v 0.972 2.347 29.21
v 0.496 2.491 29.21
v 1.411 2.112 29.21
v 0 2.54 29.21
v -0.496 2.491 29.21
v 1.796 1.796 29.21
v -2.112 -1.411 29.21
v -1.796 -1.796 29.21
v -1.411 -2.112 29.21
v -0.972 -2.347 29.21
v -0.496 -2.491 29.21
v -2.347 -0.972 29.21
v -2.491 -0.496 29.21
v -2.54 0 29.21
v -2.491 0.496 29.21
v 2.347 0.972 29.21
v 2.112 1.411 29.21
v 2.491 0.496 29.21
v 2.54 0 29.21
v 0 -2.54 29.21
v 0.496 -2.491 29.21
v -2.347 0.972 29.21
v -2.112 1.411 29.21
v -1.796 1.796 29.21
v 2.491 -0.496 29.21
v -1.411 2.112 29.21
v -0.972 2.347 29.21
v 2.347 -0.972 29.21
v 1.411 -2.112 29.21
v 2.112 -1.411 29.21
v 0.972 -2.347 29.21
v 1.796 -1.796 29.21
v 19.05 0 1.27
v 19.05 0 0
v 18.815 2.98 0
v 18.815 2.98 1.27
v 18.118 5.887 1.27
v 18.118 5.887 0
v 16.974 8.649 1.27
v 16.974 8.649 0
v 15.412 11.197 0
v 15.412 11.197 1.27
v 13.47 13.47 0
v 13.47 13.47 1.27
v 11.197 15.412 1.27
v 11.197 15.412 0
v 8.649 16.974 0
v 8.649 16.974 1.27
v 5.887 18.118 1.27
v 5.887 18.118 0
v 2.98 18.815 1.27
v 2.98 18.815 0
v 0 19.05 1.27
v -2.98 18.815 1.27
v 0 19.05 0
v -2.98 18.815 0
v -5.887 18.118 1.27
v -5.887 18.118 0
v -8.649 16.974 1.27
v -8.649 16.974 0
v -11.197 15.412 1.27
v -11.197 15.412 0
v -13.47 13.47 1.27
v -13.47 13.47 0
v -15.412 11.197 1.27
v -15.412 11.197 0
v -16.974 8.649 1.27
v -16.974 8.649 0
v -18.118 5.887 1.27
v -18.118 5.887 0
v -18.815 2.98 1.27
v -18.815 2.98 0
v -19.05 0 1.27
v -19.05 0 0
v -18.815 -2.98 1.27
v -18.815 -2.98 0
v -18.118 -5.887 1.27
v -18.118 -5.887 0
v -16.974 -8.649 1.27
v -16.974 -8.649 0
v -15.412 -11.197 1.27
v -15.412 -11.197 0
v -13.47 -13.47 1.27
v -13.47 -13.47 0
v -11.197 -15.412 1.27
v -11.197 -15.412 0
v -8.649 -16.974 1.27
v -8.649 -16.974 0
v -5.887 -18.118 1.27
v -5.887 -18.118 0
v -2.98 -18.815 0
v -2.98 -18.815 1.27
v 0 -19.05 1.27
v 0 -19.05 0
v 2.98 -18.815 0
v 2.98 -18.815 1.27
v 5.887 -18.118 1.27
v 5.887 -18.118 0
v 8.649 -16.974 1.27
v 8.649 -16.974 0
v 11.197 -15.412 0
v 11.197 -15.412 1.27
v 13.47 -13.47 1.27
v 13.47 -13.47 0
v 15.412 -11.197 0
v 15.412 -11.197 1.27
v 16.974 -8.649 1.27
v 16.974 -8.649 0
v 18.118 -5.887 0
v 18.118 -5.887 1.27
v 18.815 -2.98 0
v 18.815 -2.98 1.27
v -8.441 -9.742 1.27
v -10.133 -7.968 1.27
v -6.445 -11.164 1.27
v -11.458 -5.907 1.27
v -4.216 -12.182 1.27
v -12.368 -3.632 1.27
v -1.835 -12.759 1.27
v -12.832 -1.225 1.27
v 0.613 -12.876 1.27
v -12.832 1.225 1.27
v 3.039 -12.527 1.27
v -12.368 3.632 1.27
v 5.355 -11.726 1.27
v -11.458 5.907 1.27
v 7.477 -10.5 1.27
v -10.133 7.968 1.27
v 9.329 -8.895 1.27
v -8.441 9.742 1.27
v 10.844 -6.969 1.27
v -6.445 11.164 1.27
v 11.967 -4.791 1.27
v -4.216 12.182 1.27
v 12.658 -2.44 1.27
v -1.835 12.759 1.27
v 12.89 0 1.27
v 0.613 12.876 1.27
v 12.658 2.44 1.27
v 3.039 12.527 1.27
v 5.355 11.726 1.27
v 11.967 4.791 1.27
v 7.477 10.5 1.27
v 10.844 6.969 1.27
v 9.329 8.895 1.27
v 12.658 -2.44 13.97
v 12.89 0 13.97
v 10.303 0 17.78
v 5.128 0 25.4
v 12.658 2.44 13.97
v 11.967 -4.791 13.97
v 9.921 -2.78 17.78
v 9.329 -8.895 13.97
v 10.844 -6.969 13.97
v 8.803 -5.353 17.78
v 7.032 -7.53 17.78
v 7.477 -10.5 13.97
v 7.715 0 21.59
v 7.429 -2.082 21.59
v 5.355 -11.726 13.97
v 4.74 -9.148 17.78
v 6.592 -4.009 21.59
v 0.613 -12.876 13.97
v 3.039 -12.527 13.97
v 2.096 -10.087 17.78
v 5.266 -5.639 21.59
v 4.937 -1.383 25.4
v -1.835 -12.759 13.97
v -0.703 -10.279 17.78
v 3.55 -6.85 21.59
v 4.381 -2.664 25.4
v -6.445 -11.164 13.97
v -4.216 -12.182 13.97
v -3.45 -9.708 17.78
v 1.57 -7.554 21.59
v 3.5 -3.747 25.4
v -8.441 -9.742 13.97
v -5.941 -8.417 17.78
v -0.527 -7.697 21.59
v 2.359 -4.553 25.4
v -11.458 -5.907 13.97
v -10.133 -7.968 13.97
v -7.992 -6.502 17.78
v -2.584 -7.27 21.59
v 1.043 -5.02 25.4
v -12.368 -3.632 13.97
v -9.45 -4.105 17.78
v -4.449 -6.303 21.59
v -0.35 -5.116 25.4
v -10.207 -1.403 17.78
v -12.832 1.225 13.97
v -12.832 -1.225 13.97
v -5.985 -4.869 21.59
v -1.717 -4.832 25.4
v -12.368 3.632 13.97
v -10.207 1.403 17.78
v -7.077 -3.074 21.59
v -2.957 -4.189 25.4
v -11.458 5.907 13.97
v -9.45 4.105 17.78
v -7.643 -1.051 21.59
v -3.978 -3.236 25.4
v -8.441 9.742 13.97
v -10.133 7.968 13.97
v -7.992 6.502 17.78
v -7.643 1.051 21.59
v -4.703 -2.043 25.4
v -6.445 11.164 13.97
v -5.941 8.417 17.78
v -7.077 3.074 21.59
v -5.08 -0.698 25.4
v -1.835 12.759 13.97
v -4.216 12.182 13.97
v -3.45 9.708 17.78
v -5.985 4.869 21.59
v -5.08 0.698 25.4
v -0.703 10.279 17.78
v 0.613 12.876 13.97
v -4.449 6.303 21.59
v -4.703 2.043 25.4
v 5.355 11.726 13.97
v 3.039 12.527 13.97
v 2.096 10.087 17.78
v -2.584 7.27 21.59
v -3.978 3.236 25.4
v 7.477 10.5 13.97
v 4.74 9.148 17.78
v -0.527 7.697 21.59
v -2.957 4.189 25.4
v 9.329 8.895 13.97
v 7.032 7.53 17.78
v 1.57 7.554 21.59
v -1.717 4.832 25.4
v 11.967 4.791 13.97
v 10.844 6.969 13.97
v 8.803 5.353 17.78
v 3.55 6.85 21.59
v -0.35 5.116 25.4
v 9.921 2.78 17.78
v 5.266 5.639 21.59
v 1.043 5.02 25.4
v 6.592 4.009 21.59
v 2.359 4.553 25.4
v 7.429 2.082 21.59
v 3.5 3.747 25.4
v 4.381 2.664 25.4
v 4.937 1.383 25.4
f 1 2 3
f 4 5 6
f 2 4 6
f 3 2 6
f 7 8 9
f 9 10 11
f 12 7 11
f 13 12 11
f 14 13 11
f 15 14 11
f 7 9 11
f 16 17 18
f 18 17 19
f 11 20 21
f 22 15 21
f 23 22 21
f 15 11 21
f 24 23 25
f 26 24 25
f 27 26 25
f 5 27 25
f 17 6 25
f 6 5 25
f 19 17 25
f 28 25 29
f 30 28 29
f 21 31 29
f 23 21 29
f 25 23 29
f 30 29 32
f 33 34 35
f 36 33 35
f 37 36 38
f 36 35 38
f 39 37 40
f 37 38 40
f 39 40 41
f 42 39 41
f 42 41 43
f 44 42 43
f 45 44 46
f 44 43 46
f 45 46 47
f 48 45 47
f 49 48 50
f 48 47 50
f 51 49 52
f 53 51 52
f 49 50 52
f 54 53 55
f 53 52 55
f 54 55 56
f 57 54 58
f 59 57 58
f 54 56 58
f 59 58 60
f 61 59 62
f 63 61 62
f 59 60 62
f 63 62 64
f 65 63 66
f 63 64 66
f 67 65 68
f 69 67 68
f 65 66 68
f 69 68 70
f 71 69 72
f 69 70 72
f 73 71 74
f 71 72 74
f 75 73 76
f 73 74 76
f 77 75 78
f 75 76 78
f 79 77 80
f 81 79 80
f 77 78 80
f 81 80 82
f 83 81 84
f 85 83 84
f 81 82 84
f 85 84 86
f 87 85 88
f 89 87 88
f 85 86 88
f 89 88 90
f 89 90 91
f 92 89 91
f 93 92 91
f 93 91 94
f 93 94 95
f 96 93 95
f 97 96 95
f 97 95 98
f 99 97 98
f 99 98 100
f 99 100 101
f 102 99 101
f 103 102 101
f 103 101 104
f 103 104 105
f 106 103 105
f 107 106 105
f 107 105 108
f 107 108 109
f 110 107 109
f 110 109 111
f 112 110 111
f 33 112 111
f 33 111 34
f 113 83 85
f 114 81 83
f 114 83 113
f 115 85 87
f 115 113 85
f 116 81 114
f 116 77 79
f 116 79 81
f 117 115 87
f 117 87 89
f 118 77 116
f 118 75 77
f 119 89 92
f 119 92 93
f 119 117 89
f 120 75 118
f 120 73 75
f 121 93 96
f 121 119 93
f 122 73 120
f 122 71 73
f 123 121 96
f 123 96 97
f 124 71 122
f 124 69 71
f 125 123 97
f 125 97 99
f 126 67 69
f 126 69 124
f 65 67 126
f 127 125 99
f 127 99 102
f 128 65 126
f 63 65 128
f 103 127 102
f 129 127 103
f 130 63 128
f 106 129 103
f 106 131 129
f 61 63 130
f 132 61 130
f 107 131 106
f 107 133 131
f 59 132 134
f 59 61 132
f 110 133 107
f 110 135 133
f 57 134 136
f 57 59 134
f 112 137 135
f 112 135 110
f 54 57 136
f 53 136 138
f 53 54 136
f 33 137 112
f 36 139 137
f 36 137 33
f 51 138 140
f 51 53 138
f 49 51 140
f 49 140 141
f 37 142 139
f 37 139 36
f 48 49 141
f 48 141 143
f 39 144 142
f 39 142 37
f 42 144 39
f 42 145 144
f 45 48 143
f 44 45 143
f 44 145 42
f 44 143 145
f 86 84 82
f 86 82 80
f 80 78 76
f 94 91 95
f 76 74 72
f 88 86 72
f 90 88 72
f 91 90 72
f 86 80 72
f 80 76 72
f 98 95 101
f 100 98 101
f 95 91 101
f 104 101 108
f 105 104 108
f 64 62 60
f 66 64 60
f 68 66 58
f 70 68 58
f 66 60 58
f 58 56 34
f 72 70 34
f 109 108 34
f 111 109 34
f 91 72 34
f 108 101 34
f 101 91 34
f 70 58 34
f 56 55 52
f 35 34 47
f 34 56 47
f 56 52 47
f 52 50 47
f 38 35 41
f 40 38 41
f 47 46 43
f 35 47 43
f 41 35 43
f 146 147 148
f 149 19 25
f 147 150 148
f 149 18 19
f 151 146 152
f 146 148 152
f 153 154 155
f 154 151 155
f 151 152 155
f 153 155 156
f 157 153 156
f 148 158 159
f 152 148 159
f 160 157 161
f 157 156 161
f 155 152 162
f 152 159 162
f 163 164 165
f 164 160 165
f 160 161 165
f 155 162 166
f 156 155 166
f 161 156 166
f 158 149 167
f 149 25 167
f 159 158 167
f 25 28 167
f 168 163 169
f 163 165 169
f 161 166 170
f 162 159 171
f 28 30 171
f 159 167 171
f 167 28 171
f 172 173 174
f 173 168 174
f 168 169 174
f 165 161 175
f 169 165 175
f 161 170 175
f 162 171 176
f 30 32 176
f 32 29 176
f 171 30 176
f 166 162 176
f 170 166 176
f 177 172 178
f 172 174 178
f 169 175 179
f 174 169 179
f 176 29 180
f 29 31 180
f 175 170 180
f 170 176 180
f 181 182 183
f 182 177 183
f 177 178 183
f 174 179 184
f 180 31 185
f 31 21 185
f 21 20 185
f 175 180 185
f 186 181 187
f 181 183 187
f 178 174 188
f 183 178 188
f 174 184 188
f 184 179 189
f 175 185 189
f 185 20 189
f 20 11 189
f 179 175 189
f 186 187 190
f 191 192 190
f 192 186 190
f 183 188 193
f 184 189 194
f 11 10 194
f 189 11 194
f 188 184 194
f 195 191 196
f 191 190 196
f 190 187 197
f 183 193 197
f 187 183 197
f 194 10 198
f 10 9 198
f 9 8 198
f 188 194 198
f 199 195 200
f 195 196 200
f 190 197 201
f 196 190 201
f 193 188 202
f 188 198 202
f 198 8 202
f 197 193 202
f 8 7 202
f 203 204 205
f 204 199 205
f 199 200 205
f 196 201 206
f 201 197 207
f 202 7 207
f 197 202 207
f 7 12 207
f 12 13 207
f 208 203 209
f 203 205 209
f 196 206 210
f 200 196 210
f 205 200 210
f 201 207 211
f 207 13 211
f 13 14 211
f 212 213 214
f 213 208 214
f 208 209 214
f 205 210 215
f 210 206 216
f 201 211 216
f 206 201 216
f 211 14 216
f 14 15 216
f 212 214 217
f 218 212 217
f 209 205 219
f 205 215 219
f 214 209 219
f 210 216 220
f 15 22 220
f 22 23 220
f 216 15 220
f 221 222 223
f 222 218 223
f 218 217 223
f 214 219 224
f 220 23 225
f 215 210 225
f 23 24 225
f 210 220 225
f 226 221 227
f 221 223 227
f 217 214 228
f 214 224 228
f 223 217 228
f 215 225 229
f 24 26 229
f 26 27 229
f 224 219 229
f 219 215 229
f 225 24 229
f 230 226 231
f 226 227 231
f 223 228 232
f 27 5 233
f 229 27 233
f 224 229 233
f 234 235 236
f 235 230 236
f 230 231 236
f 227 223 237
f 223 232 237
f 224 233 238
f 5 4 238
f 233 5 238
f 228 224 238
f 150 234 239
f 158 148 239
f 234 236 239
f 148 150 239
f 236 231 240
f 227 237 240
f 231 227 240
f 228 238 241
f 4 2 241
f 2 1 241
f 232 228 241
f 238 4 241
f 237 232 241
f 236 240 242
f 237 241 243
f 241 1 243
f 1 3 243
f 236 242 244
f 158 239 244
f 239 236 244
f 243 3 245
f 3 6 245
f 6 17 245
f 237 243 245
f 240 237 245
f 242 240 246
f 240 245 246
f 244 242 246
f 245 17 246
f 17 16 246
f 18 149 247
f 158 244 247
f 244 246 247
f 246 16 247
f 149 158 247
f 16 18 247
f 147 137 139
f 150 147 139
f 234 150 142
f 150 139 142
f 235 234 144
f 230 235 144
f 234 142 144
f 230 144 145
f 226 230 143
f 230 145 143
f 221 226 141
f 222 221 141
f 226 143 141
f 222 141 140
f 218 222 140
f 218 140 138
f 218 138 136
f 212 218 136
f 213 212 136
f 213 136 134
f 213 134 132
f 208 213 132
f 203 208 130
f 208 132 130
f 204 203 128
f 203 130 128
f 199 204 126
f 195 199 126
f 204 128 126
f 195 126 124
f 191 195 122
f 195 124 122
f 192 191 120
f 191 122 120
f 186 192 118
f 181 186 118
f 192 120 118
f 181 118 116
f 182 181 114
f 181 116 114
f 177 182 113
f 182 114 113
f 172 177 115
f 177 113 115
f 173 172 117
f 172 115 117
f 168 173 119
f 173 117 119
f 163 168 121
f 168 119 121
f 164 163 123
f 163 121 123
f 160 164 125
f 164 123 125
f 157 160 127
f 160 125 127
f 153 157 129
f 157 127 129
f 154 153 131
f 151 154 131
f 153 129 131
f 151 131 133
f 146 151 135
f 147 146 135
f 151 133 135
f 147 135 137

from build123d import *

# Parameters (mm, degrees)
F0_R     = 19.05
F1_DEPTH = 1.27
F2_R     = 12.8905
F3_DEPTH = 12.7


with BuildPart() as f1:
    # F0 (on Top) → F1 (new body)
    with BuildSketch(Plane.XY):
        Circle(F0_R)
    extrude(amount=F1_DEPTH)

    # F2 (on face) → F3 (join)
    with BuildSketch(Plane.XY.offset(1.27)):
        Circle(F2_R)
    extrude(amount=F3_DEPTH)

    # F4 (on Front) → F5 (revolve)
    with BuildSketch(Plane.XZ):
        Polygon((2.54, 29.21), (0, 29.21), (0, 13.97), (12.8905, 13.97), align=None)
    revolve(axis=Axis((0, 0, 1.27), (0, 0, -1)))


solid = f1.part
